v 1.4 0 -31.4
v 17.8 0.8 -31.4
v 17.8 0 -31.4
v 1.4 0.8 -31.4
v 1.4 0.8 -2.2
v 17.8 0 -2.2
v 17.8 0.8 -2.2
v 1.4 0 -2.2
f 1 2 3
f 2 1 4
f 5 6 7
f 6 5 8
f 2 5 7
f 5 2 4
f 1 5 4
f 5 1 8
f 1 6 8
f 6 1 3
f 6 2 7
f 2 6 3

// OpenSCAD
// file: ../p/4-4edge.scad
use <../lib.scad>
$fa=1; $fs=0.2;
function ldraw_lib__4_4edge(realsolid=false) = [
// 0 Circle 1.0
// 0 Name: 4-4edge.dat
// 0 Author: James Jessiman
// 0 !LDRAW_ORG Primitive UPDATE 2017-01
// 0 !LICENSE Licensed under CC BY 2.0 and CC BY 4.0 : see CAreadme.txt
// 
// 0 BFC CERTIFY CCW
  [0,"BFC","CERTIFY"],
  [0,"BFC","CCW"],
// 
// 0 !HISTORY 1998-12-15 [PTadmin] Official Update 1998-10
// 0 !HISTORY 2005-12-28 [PTadmin] Official Update 2005-01
// 0 !HISTORY 2007-06-24 [PTadmin] Header formatted for Contributor Agreement
// 0 !HISTORY 2008-07-01 [PTadmin] Official Update 2008-01
// 0 !HISTORY 2017-01-15 [Steffen] BFCed
// 0 !HISTORY 2017-12-30 [PTadmin] Official Update 2017-01
// 
// 
// 2 24 1 0 0 0.9239 0 0.3827
  [2,24,1,0,0,0.9239,0,0.3827],
// 2 24 0.9239 0 0.3827 0.7071 0 0.7071
  [2,24,0.9239,0,0.3827,0.7071,0,0.7071],
// 2 24 0.7071 0 0.7071 0.3827 0 0.9239
  [2,24,0.7071,0,0.7071,0.3827,0,0.9239],
// 2 24 0.3827 0 0.9239 0 0 1
  [2,24,0.3827,0,0.9239,0,0,1],
// 2 24 0 0 1 -0.3827 0 0.9239
  [2,24,0,0,1,-0.3827,0,0.9239],
// 2 24 -0.3827 0 0.9239 -0.7071 0 0.7071
  [2,24,-0.3827,0,0.9239,-0.7071,0,0.7071],
// 2 24 -0.7071 0 0.7071 -0.9239 0 0.3827
  [2,24,-0.7071,0,0.7071,-0.9239,0,0.3827],
// 2 24 -0.9239 0 0.3827 -1 0 -0
  [2,24,-0.9239,0,0.3827,-1,0,-0],
// 2 24 -1 0 -0 -0.9239 0 -0.3827
  [2,24,-1,0,-0,-0.9239,0,-0.3827],
// 2 24 -0.9239 0 -0.3827 -0.7071 0 -0.7071
  [2,24,-0.9239,0,-0.3827,-0.7071,0,-0.7071],
// 2 24 -0.7071 0 -0.7071 -0.3827 0 -0.9239
  [2,24,-0.7071,0,-0.7071,-0.3827,0,-0.9239],
// 2 24 -0.3827 0 -0.9239 0 0 -1
  [2,24,-0.3827,0,-0.9239,0,0,-1],
// 2 24 0 0 -1 0.3827 0 -0.9239
  [2,24,0,0,-1,0.3827,0,-0.9239],
// 2 24 0.3827 0 -0.9239 0.7071 0 -0.7071
  [2,24,0.3827,0,-0.9239,0.7071,0,-0.7071],
// 2 24 0.7071 0 -0.7071 0.9239 0 -0.3827
  [2,24,0.7071,0,-0.7071,0.9239,0,-0.3827],
// 2 24 0.9239 0 -0.3827 1 0 0
  [2,24,0.9239,0,-0.3827,1,0,0],
];
module ldraw_lib__4_4edge(step=0, col=false, unit=2/5, alt=false, line=0.2, solid=!$preview)
    makepoly(ldraw_lib__4_4edge(solid), step=step, col=col, unit=unit, alt=alt, line=line, solid=solid);
ldraw_lib__4_4edge(line=0.2);
// file: ../p/4-4disc.scad
use <../lib.scad>
$fa=1; $fs=0.2;
function ldraw_lib__4_4disc(realsolid=false) = [
// 0 Disc 1.0
// 0 Name: 4-4disc.dat
// 0 Author: James Jessiman
// 0 !LDRAW_ORG Primitive UPDATE 2002-02
// 0 !LICENSE Licensed under CC BY 2.0 and CC BY 4.0 : see CAreadme.txt
// 
// 0 BFC CERTIFY CCW
  [0,"BFC","CERTIFY"],
  [0,"BFC","CCW"],
// 
// 0 !HISTORY 1998-12-15 [PTadmin] Official Update 1998-10
// 0 !HISTORY 2002-03-23 [sbliss] Added BFC statement
// 0 !HISTORY 2002-04-25 [PTadmin] Official Update 2002-02
// 0 !HISTORY 2007-06-24 [PTadmin] Header formatted for Contributor Agreement
// 0 !HISTORY 2008-07-01 [PTadmin] Official Update 2008-01
// 
// 
// 3 16 0 0 0 1 0 0 0.9239 0 0.3827
  [3,16,0,0,0,1,0,0,0.9239,0,0.3827],
// 3 16 0 0 0 0.9239 0 0.3827 0.7071 0 0.7071
  [3,16,0,0,0,0.9239,0,0.3827,0.7071,0,0.7071],
// 3 16 0 0 0 0.7071 0 0.7071 0.3827 0 0.9239
  [3,16,0,0,0,0.7071,0,0.7071,0.3827,0,0.9239],
// 3 16 0 0 0 0.3827 0 0.9239 0 0 1
  [3,16,0,0,0,0.3827,0,0.9239,0,0,1],
// 3 16 0 0 0 0 0 1 -0.3827 0 0.9239
  [3,16,0,0,0,0,0,1,-0.3827,0,0.9239],
// 3 16 0 0 0 -0.3827 0 0.9239 -0.7071 0 0.7071
  [3,16,0,0,0,-0.3827,0,0.9239,-0.7071,0,0.7071],
// 3 16 0 0 0 -0.7071 0 0.7071 -0.9239 0 0.3827
  [3,16,0,0,0,-0.7071,0,0.7071,-0.9239,0,0.3827],
// 3 16 0 0 0 -0.9239 0 0.3827 -1 0 -0
  [3,16,0,0,0,-0.9239,0,0.3827,-1,0,-0],
// 3 16 0 0 0 -1 0 -0 -0.9239 0 -0.3827
  [3,16,0,0,0,-1,0,-0,-0.9239,0,-0.3827],
// 3 16 0 0 0 -0.9239 0 -0.3827 -0.7071 0 -0.7071
  [3,16,0,0,0,-0.9239,0,-0.3827,-0.7071,0,-0.7071],
// 3 16 0 0 0 -0.7071 0 -0.7071 -0.3827 0 -0.9239
  [3,16,0,0,0,-0.7071,0,-0.7071,-0.3827,0,-0.9239],
// 3 16 0 0 0 -0.3827 0 -0.9239 0 0 -1
  [3,16,0,0,0,-0.3827,0,-0.9239,0,0,-1],
// 3 16 0 0 0 0 0 -1 0.3827 0 -0.9239
  [3,16,0,0,0,0,0,-1,0.3827,0,-0.9239],
// 3 16 0 0 0 0.3827 0 -0.9239 0.7071 0 -0.7071
  [3,16,0,0,0,0.3827,0,-0.9239,0.7071,0,-0.7071],
// 3 16 0 0 0 0.7071 0 -0.7071 0.9239 0 -0.3827
  [3,16,0,0,0,0.7071,0,-0.7071,0.9239,0,-0.3827],
// 3 16 0 0 0 0.9239 0 -0.3827 1 0 0
  [3,16,0,0,0,0.9239,0,-0.3827,1,0,0],
// 0
];
module ldraw_lib__4_4disc(step=0, col=false, unit=2/5, alt=false, line=0.2, solid=!$preview)
    makepoly(ldraw_lib__4_4disc(solid), step=step, col=col, unit=unit, alt=alt, line=line, solid=solid);
ldraw_lib__4_4disc(line=0.2);
// file: ../p/4-4cyli.scad
use <../lib.scad>
$fa=1; $fs=0.2;
function ldraw_lib__4_4cyli(realsolid=false) = [
// 0 Cylinder 1.0
// 0 Name: 4-4cyli.dat
// 0 Author: James Jessiman
// 0 !LDRAW_ORG Primitive UPDATE 2005-01
// 0 !LICENSE Licensed under CC BY 2.0 and CC BY 4.0 : see CAreadme.txt
// 
// 0 BFC CERTIFY CCW
  [0,"BFC","CERTIFY"],
  [0,"BFC","CCW"],
// 
// 0 !HISTORY 1998-12-15 [PTadmin] Official Update 1998-10
// 0 !HISTORY 2002-03-23 [sbliss] Added BFC statement; merged headers from files in distributions LDraw 0.27 and Complete.
// 0 !HISTORY 2002-04-25 [PTadmin] Official Update 2002-02
// 0 !HISTORY 2004-12-14 [guyvivan] BFC CCW
// 0 !HISTORY 2005-12-28 [PTadmin] Official Update 2005-01
// 0 !HISTORY 2007-06-24 [PTadmin] Header formatted for Contributor Agreement
// 0 !HISTORY 2008-07-01 [PTadmin] Official Update 2008-01
// 
// 
// 4 16 1 1 0 0.9239 1 0.3827 0.9239 0 0.3827 1 0 0
  [4,16,1,1,0,0.9239,1,0.3827,0.9239,0,0.3827,1,0,0],
// 5 24 1 0 0 1 1 0 0.9239 0 0.3827 0.9239 0 -0.3827
  [5,24,1,0,0,1,1,0,0.9239,0,0.3827,0.9239,0,-0.3827],
// 4 16 0.9239 1 0.3827 0.7071 1 0.7071 0.7071 0 0.7071 0.9239 0 0.3827
  [4,16,0.9239,1,0.3827,0.7071,1,0.7071,0.7071,0,0.7071,0.9239,0,0.3827],
// 5 24 0.9239 0 0.3827 0.9239 1 0.3827 0.7071 0 0.7071 1 0 0
  [5,24,0.9239,0,0.3827,0.9239,1,0.3827,0.7071,0,0.7071,1,0,0],
// 4 16 0.7071 1 0.7071 0.3827 1 0.9239 0.3827 0 0.9239 0.7071 0 0.7071
  [4,16,0.7071,1,0.7071,0.3827,1,0.9239,0.3827,0,0.9239,0.7071,0,0.7071],
// 5 24 0.7071 0 0.7071 0.7071 1 0.7071 0.3827 0 0.9239 0.9239 0 0.3827
  [5,24,0.7071,0,0.7071,0.7071,1,0.7071,0.3827,0,0.9239,0.9239,0,0.3827],
// 4 16 0.3827 1 0.9239 0 1 1 0 0 1 0.3827 0 0.9239
  [4,16,0.3827,1,0.9239,0,1,1,0,0,1,0.3827,0,0.9239],
// 5 24 0.3827 0 0.9239 0.3827 1 0.9239 0 0 1 0.7071 0 0.7071
  [5,24,0.3827,0,0.9239,0.3827,1,0.9239,0,0,1,0.7071,0,0.7071],
// 4 16 0 1 1 -0.3827 1 0.9239 -0.3827 0 0.9239 0 0 1
  [4,16,0,1,1,-0.3827,1,0.9239,-0.3827,0,0.9239,0,0,1],
// 5 24 0 0 1 0 1 1 -0.3827 0 0.9239 0.3827 0 0.9239
  [5,24,0,0,1,0,1,1,-0.3827,0,0.9239,0.3827,0,0.9239],
// 4 16 -0.3827 1 0.9239 -0.7071 1 0.7071 -0.7071 0 0.7071 -0.3827 0 0.9239
  [4,16,-0.3827,1,0.9239,-0.7071,1,0.7071,-0.7071,0,0.7071,-0.3827,0,0.9239],
// 5 24 -0.3827 0 0.9239 -0.3827 1 0.9239 -0.7071 0 0.7071 0 0 1
  [5,24,-0.3827,0,0.9239,-0.3827,1,0.9239,-0.7071,0,0.7071,0,0,1],
// 4 16 -0.7071 1 0.7071 -0.9239 1 0.3827 -0.9239 0 0.3827 -0.7071 0 0.7071
  [4,16,-0.7071,1,0.7071,-0.9239,1,0.3827,-0.9239,0,0.3827,-0.7071,0,0.7071],
// 5 24 -0.7071 0 0.7071 -0.7071 1 0.7071 -0.9239 0 0.3827 -0.3827 0 0.9239
  [5,24,-0.7071,0,0.7071,-0.7071,1,0.7071,-0.9239,0,0.3827,-0.3827,0,0.9239],
// 4 16 -0.9239 1 0.3827 -1 1 0 -1 0 0 -0.9239 0 0.3827
  [4,16,-0.9239,1,0.3827,-1,1,0,-1,0,0,-0.9239,0,0.3827],
// 5 24 -0.9239 0 0.3827 -0.9239 1 0.3827 -1 0 0 -0.7071 0 0.7071
  [5,24,-0.9239,0,0.3827,-0.9239,1,0.3827,-1,0,0,-0.7071,0,0.7071],
// 4 16 -1 1 0 -0.9239 1 -0.3827 -0.9239 0 -0.3827 -1 0 0
  [4,16,-1,1,0,-0.9239,1,-0.3827,-0.9239,0,-0.3827,-1,0,0],
// 5 24 -1 0 0 -1 1 0 -0.9239 0 -0.3827 -0.9239 0 0.3827
  [5,24,-1,0,0,-1,1,0,-0.9239,0,-0.3827,-0.9239,0,0.3827],
// 4 16 -0.9239 1 -0.3827 -0.7071 1 -0.7071 -0.7071 0 -0.7071 -0.9239 0 -0.3827
  [4,16,-0.9239,1,-0.3827,-0.7071,1,-0.7071,-0.7071,0,-0.7071,-0.9239,0,-0.3827],
// 5 24 -0.9239 0 -0.3827 -0.9239 1 -0.3827 -0.7071 0 -0.7071 -1 0 0
  [5,24,-0.9239,0,-0.3827,-0.9239,1,-0.3827,-0.7071,0,-0.7071,-1,0,0],
// 4 16 -0.7071 1 -0.7071 -0.3827 1 -0.9239 -0.3827 0 -0.9239 -0.7071 0 -0.7071
  [4,16,-0.7071,1,-0.7071,-0.3827,1,-0.9239,-0.3827,0,-0.9239,-0.7071,0,-0.7071],
// 5 24 -0.7071 0 -0.7071 -0.7071 1 -0.7071 -0.3827 0 -0.9239 -0.9239 0 -0.3827
  [5,24,-0.7071,0,-0.7071,-0.7071,1,-0.7071,-0.3827,0,-0.9239,-0.9239,0,-0.3827],
// 4 16 -0.3827 1 -0.9239 0 1 -1 0 0 -1 -0.3827 0 -0.9239
  [4,16,-0.3827,1,-0.9239,0,1,-1,0,0,-1,-0.3827,0,-0.9239],
// 5 24 -0.3827 0 -0.9239 -0.3827 1 -0.9239 0 0 -1 -0.7071 0 -0.7071
  [5,24,-0.3827,0,-0.9239,-0.3827,1,-0.9239,0,0,-1,-0.7071,0,-0.7071],
// 4 16 0 1 -1 0.3827 1 -0.9239 0.3827 0 -0.9239 0 0 -1
  [4,16,0,1,-1,0.3827,1,-0.9239,0.3827,0,-0.9239,0,0,-1],
// 5 24 0 0 -1 0 1 -1 0.3827 0 -0.9239 -0.3827 0 -0.9239
  [5,24,0,0,-1,0,1,-1,0.3827,0,-0.9239,-0.3827,0,-0.9239],
// 4 16 0.3827 1 -0.9239 0.7071 1 -0.7071 0.7071 0 -0.7071 0.3827 0 -0.9239
  [4,16,0.3827,1,-0.9239,0.7071,1,-0.7071,0.7071,0,-0.7071,0.3827,0,-0.9239],
// 5 24 0.3827 0 -0.9239 0.3827 1 -0.9239 0.7071 0 -0.7071 0 0 -1
  [5,24,0.3827,0,-0.9239,0.3827,1,-0.9239,0.7071,0,-0.7071,0,0,-1],
// 4 16 0.7071 1 -0.7071 0.9239 1 -0.3827 0.9239 0 -0.3827 0.7071 0 -0.7071
  [4,16,0.7071,1,-0.7071,0.9239,1,-0.3827,0.9239,0,-0.3827,0.7071,0,-0.7071],
// 5 24 0.7071 0 -0.7071 0.7071 1 -0.7071 0.9239 0 -0.3827 0.3827 0 -0.9239
  [5,24,0.7071,0,-0.7071,0.7071,1,-0.7071,0.9239,0,-0.3827,0.3827,0,-0.9239],
// 4 16 0.9239 1 -0.3827 1 1 0 1 0 0 0.9239 0 -0.3827
  [4,16,0.9239,1,-0.3827,1,1,0,1,0,0,0.9239,0,-0.3827],
// 5 24 0.9239 0 -0.3827 0.9239 1 -0.3827 1 0 0 0.7071 0 -0.7071
  [5,24,0.9239,0,-0.3827,0.9239,1,-0.3827,1,0,0,0.7071,0,-0.7071],
// 0
];
module ldraw_lib__4_4cyli(step=0, col=false, unit=2/5, alt=false, line=0.2, solid=!$preview)
    makepoly(ldraw_lib__4_4cyli(solid), step=step, col=col, unit=unit, alt=alt, line=line, solid=solid);
ldraw_lib__4_4cyli(line=0.2);
// file: ../p/stud3.scad
use <../lib.scad>
use <4-4cyli.scad>
use <4-4disc.scad>
use <4-4edge.scad>
$fa=1; $fs=0.2;
function ldraw_lib__stud3(realsolid=false) = realsolid ? 
    [openscad(translate([0,0,-eps()], o=cylinder(4+eps(), r=4)),2)] : [
// 0 Stud Tube Solid
// 0 Name: stud3.dat
// 0 Author: James Jessiman
// 0 !LDRAW_ORG Primitive UPDATE 2012-01
// 0 !LICENSE Licensed under CC BY 2.0 and CC BY 4.0 : see CAreadme.txt
// 
// 0 BFC CERTIFY CCW
  [0,"BFC","CERTIFY"],
  [0,"BFC","CCW"],
// 
// 0 !HISTORY 2002-04-04 [sbliss] Modified for BFC compliance
// 0 !HISTORY 2002-04-25 [PTadmin] Official Update 2002-02
// 0 !HISTORY 2007-06-24 [PTadmin] Header formatted for Contributor Agreement
// 0 !HISTORY 2008-07-01 [PTadmin] Official Update 2008-01
// 0 !HISTORY 2012-02-16 [Philo] Changed to CCW
// 0 !HISTORY 2012-03-30 [PTadmin] Official Update 2012-01
// 
// 
// 1 16 0 -4 0 4 0 0 0 1 0 0 0 4 4-4edge.dat
  [1,16,0,-4,0,4,0,0,0,1,0,0,0,4, ldraw_lib__4_4edge(realsolid)],
// 1 16 0 0 0 4 0 0 0 1 0 0 0 4 4-4edge.dat
  [1,16,0,0,0,4,0,0,0,1,0,0,0,4, ldraw_lib__4_4edge(realsolid)],
// 1 16 0 -4 0 4 0 0 0 1 0 0 0 4 4-4disc.dat
  [1,16,0,-4,0,4,0,0,0,1,0,0,0,4, ldraw_lib__4_4disc(realsolid)],
// 1 16 0 -4 0 4 0 0 0 4 0 0 0 4 4-4cyli.dat
  [1,16,0,-4,0,4,0,0,0,4,0,0,0,4, ldraw_lib__4_4cyli(realsolid)],
];
module ldraw_lib__stud3(step=0, col=false, unit=2/5, alt=false, line=0.2, solid=!$preview)
    makepoly(ldraw_lib__stud3(solid), step=step, col=col, unit=unit, alt=alt, line=line, solid=solid);
ldraw_lib__stud3(line=0.2);
// file: ../p/stud.scad
use <../lib.scad>
use <4-4cyli.scad>
use <4-4disc.scad>
use <4-4edge.scad>
$fa=1; $fs=0.2;
function ldraw_lib__stud(realsolid=false) = realsolid ? 
    [openscad(translate([0,0,-eps()], o=cylinder(4+eps(), r=6)),2)] : [
// 0 Stud
// 0 Name: stud.dat
// 0 Author: James Jessiman
// 0 !LDRAW_ORG Primitive UPDATE 2012-01
// 0 !LICENSE Licensed under CC BY 2.0 and CC BY 4.0 : see CAreadme.txt
// 
// 0 BFC CERTIFY CCW
  [0,"BFC","CERTIFY"],
  [0,"BFC","CCW"],
// 
// 0 !HISTORY 2002-04-04 [sbliss] Modified for BFC compliance
// 0 !HISTORY 2002-04-25 [PTadmin] Official Update 2002-02
// 0 !HISTORY 2007-06-24 [PTadmin] Header formatted for Contributor Agreement
// 0 !HISTORY 2008-07-01 [PTadmin] Official Update 2008-01
// 0 !HISTORY 2012-02-16 [Philo] Changed to CCW
// 0 !HISTORY 2012-03-30 [PTadmin] Official Update 2012-01
// 
// 
// 1 16 0 0 0 6 0 0 0 1 0 0 0 6 4-4edge.dat
  [1,16,0,0,0,6,0,0,0,1,0,0,0,6, ldraw_lib__4_4edge(realsolid)],
// 1 16 0 -4 0 6 0 0 0 1 0 0 0 6 4-4edge.dat
  [1,16,0,-4,0,6,0,0,0,1,0,0,0,6, ldraw_lib__4_4edge(realsolid)],
// 1 16 0 0 0 6 0 0 0 -4 0 0 0 6 4-4cyli.dat
  [1,16,0,0,0,6,0,0,0,-4,0,0,0,6, ldraw_lib__4_4cyli(realsolid)],
// 1 16 0 -4 0 6 0 0 0 1 0 0 0 6 4-4disc.dat
  [1,16,0,-4,0,6,0,0,0,1,0,0,0,6, ldraw_lib__4_4disc(realsolid)],
];
module ldraw_lib__stud(step=0, col=false, unit=2/5, alt=false, line=0.2, solid=!$preview)
    makepoly(ldraw_lib__stud(solid), step=step, col=col, unit=unit, alt=alt, line=line, solid=solid);
ldraw_lib__stud(line=0.2);
// file: ../p/box5.scad
use <../lib.scad>
$fa=1; $fs=0.2;
function ldraw_lib__box5(realsolid=false) = [
// 0 Box with 5 Faces and All Edges
// 0 Name: box5.dat
// 0 Author: James Jessiman
// 0 !LDRAW_ORG Primitive UPDATE 2012-01
// 0 !LICENSE Licensed under CC BY 2.0 and CC BY 4.0 : see CAreadme.txt
// 
// 0 BFC CERTIFY CCW
  [0,"BFC","CERTIFY"],
  [0,"BFC","CCW"],
// 
// 0 !HISTORY 2002-04-03 [sbliss] Modified for BFC compliance
// 0 !HISTORY 2002-04-25 [PTadmin] Official Update 2002-02
// 0 !HISTORY 2007-06-24 [PTadmin] Header formatted for Contributor Agreement
// 0 !HISTORY 2008-07-01 [PTadmin] Official Update 2008-01
// 0 !HISTORY 2012-02-16 [Philo] Changed to CCW
// 0 !HISTORY 2012-03-30 [PTadmin] Official Update 2012-01
// 
// 
// 2 24 1 1 1 -1 1 1
  [2,24,1,1,1,-1,1,1],
// 2 24 -1 1 1 -1 1 -1
  [2,24,-1,1,1,-1,1,-1],
// 2 24 -1 1 -1 1 1 -1
  [2,24,-1,1,-1,1,1,-1],
// 2 24 1 1 -1 1 1 1
  [2,24,1,1,-1,1,1,1],
// 2 24 1 0 1 -1 0 1
  [2,24,1,0,1,-1,0,1],
// 2 24 -1 0 1 -1 0 -1
  [2,24,-1,0,1,-1,0,-1],
// 2 24 -1 0 -1 1 0 -1
  [2,24,-1,0,-1,1,0,-1],
// 2 24 1 0 -1 1 0 1
  [2,24,1,0,-1,1,0,1],
// 2 24 1 0 1 1 1 1
  [2,24,1,0,1,1,1,1],
// 2 24 -1 0 1 -1 1 1
  [2,24,-1,0,1,-1,1,1],
// 2 24 1 0 -1 1 1 -1
  [2,24,1,0,-1,1,1,-1],
// 2 24 -1 0 -1 -1 1 -1
  [2,24,-1,0,-1,-1,1,-1],
// 4 16 -1 1 1 1 1 1 1 1 -1 -1 1 -1
  [4,16,-1,1,1,1,1,1,1,1,-1,-1,1,-1],
// 4 16 -1 1 1 -1 0 1 1 0 1 1 1 1
  [4,16,-1,1,1,-1,0,1,1,0,1,1,1,1],
// 4 16 -1 1 -1 -1 0 -1 -1 0 1 -1 1 1
  [4,16,-1,1,-1,-1,0,-1,-1,0,1,-1,1,1],
// 4 16 1 1 -1 1 0 -1 -1 0 -1 -1 1 -1
  [4,16,1,1,-1,1,0,-1,-1,0,-1,-1,1,-1],
// 4 16 1 1 1 1 0 1 1 0 -1 1 1 -1
  [4,16,1,1,1,1,0,1,1,0,-1,1,1,-1],
];
module ldraw_lib__box5(step=0, col=false, unit=2/5, alt=false, line=0.2, solid=!$preview)
    makepoly(ldraw_lib__box5(solid), step=step, col=col, unit=unit, alt=alt, line=line, solid=solid);
ldraw_lib__box5(line=0.2);
// file: ../p/box4t.scad
use <../lib.scad>
$fa=1; $fs=0.2;
function ldraw_lib__box4t(realsolid=false) = [
// 0 Box with 4 Adjacent Faces and All Edges
// 0 Name: box4t.dat
// 0 Author: Tore Eriksson [Tore_Eriksson]
// 0 !LDRAW_ORG Primitive UPDATE 2003-02
// 0 !LICENSE Licensed under CC BY 2.0 and CC BY 4.0 : see CAreadme.txt
// 
// 0 BFC CERTIFY CCW
  [0,"BFC","CERTIFY"],
  [0,"BFC","CCW"],
// 
// 0 !HISTORY 1997-09-29 [PTadmin] Official Update 1997-15
// 0 !HISTORY 2002-08-31 [izanette] Modified with WINDZ for BFC compliance
// 0 !HISTORY 2003-08-01 [PTadmin] Official Update 2003-02
// 0 !HISTORY 2007-06-24 [PTadmin] Header formatted for Contributor Agreement
// 0 !HISTORY 2008-07-01 [PTadmin] Official Update 2008-01
// 
// 
// 2 24 1 1 1 -1 1 1
  [2,24,1,1,1,-1,1,1],
// 2 24 -1 1 1 -1 1 -1
  [2,24,-1,1,1,-1,1,-1],
// 2 24 -1 1 -1 1 1 -1
  [2,24,-1,1,-1,1,1,-1],
// 2 24 1 1 -1 1 1 1
  [2,24,1,1,-1,1,1,1],
// 2 24 1 0 1 -1 0 1
  [2,24,1,0,1,-1,0,1],
// 2 24 -1 0 1 -1 0 -1
  [2,24,-1,0,1,-1,0,-1],
// 2 24 -1 0 -1 1 0 -1
  [2,24,-1,0,-1,1,0,-1],
// 2 24 1 0 -1 1 0 1
  [2,24,1,0,-1,1,0,1],
// 2 24 1 0 1 1 1 1
  [2,24,1,0,1,1,1,1],
// 2 24 -1 0 1 -1 1 1
  [2,24,-1,0,1,-1,1,1],
// 2 24 1 0 -1 1 1 -1
  [2,24,1,0,-1,1,1,-1],
// 2 24 -1 0 -1 -1 1 -1
  [2,24,-1,0,-1,-1,1,-1],
// 4 16 1 1 1 1 1 -1 -1 1 -1 -1 1 1
  [4,16,1,1,1,1,1,-1,-1,1,-1,-1,1,1],
// 4 16 1 1 1 -1 1 1 -1 0 1 1 0 1
  [4,16,1,1,1,-1,1,1,-1,0,1,1,0,1],
// 4 16 -1 1 1 -1 1 -1 -1 0 -1 -1 0 1
  [4,16,-1,1,1,-1,1,-1,-1,0,-1,-1,0,1],
// 0 4 16 -1 1 -1 -1 0 -1 1 0 -1 1 1 -1
// 4 16 1 1 -1 1 1 1 1 0 1 1 0 -1
  [4,16,1,1,-1,1,1,1,1,0,1,1,0,-1],
// 0
];
module ldraw_lib__box4t(step=0, col=false, unit=2/5, alt=false, line=0.2, solid=!$preview)
    makepoly(ldraw_lib__box4t(solid), step=step, col=col, unit=unit, alt=alt, line=line, solid=solid);
ldraw_lib__box4t(line=0.2);
// file: s/3004s01.scad
use <../../lib.scad>
use <../../p/box4t.scad>
use <../../p/box5.scad>
use <../../p/stud.scad>
use <../../p/stud3.scad>
$fa=1; $fs=0.2;
function ldraw_lib__s__3004s01(realsolid=false) = [
// 0 ~Brick  1 x  2 without Front Face
// 0 Name: s\3004s01.dat
// 0 Author: James Jessiman
// 0 !LDRAW_ORG Subpart UPDATE 2003-03
// 0 !LICENSE Licensed under CC BY 2.0 and CC BY 4.0 : see CAreadme.txt
// 
// 0 BFC CERTIFY CCW
  [0,"BFC","CERTIFY"],
  [0,"BFC","CCW"],
// 
// 0 !HISTORY 2003-09-07 [jriley] Subfiling, BFC
// 0 !HISTORY 2003-12-19 [PTadmin] Official Update 2003-03
// 0 !HISTORY 2007-08-29 [PTadmin] Header formatted for Contributor Agreement
// 0 !HISTORY 2008-07-01 [PTadmin] Official Update 2008-01
// 
// 
// 1 16 0 4 0 1 0 0 0 -5 0 0 0 1 stud3.dat
  [1,16,0,4,0,1,0,0,0,-5,0,0,0,1, ldraw_lib__stud3(realsolid)],
// 0 BFC INVERTNEXT
  [0,"BFC","INVERTNEXT"],
// 1 16 0 24 0 16 0 0 0 -20 0 0 0 6 box5.dat
  [1,16,0,24,0,16,0,0,0,-20,0,0,0,6, ldraw_lib__box5(realsolid)],
// 4 16 20 24 10 16 24 6 -16 24 6 -20 24 10
  [4,16,20,24,10,16,24,6,-16,24,6,-20,24,10],
// 4 16 -20 24 10 -16 24 6 -16 24 -6 -20 24 -10
  [4,16,-20,24,10,-16,24,6,-16,24,-6,-20,24,-10],
// 4 16 -20 24 -10 -16 24 -6 16 24 -6 20 24 -10
  [4,16,-20,24,-10,-16,24,-6,16,24,-6,20,24,-10],
// 4 16 20 24 -10 16 24 -6 16 24 6 20 24 10
  [4,16,20,24,-10,16,24,-6,16,24,6,20,24,10],
// 1 16 0 24 0 20 0 0 0 -24 0 0 0 10 box4t.dat
  [1,16,0,24,0,20,0,0,0,-24,0,0,0,10, ldraw_lib__box4t(realsolid)],
// 1 16 10 0 0 1 0 0 0 1 0 0 0 1 stud.dat
  [1,16,10,0,0,1,0,0,0,1,0,0,0,1, ldraw_lib__stud(realsolid)],
// 1 16 -10 0 0 1 0 0 0 1 0 0 0 1 stud.dat
  [1,16,-10,0,0,1,0,0,0,1,0,0,0,1, ldraw_lib__stud(realsolid)],
// 0
];
module ldraw_lib__s__3004s01(step=0, col=false, unit=2/5, alt=false, line=0.2, solid=!$preview)
    makepoly(ldraw_lib__s__3004s01(solid), step=step, col=col, unit=unit, alt=alt, line=line, solid=solid);
ldraw_lib__s__3004s01(line=0.2);
// file: 3004.scad
use <../lib.scad>
use <s/3004s01.scad>
$fa=1; $fs=0.2;
function ldraw_lib__3004(realsolid=false) = [
// 0 Brick  1 x  2
// 0 Name: 3004.dat
// 0 Author: James Jessiman
// 0 !LDRAW_ORG Part UPDATE 2022-05
// 0 !LICENSE Licensed under CC BY 2.0 and CC BY 4.0 : see CAreadme.txt
// 
// 0 BFC CERTIFY CCW
  [0,"BFC","CERTIFY"],
  [0,"BFC","CCW"],
// 
// 0 !HISTORY 2001-10-26 [PTadmin] Official Update 2001-01
// 0 !HISTORY 2002-05-07 {unknown} BFC Certification
// 0 !HISTORY 2002-06-11 [PTadmin] Official Update 2002-03
// 0 !HISTORY 2007-05-07 [PTadmin] Header formatted for Contributor Agreement
// 0 !HISTORY 2008-07-01 [PTadmin] Official Update 2008-01
// 0 !HISTORY 2022-08-04 [MagFors] Using subfile
// 0 !HISTORY 2022-09-15 [PTadmin] Official Update 2022-05
// 
// 
// 1 16 0 0 0 1 0 0 0 1 0 0 0 1 s\3004s01.dat
  [1,16,0,0,0,1,0,0,0,1,0,0,0,1, ldraw_lib__s__3004s01(realsolid)],
// 4 16 -20 24 -10 20 24 -10 20 0 -10 -20 0 -10
  [4,16,-20,24,-10,20,24,-10,20,0,-10,-20,0,-10],
];
module ldraw_lib__3004(step=0, col=false, unit=2/5, alt=false, line=0.2, solid=!$preview)
    makepoly(ldraw_lib__3004(solid), step=step, col=col, unit=unit, alt=alt, line=line, solid=solid);
ldraw_lib__3004(line=0.2);
// file: ../p/box.scad
use <../lib.scad>
$fa=1; $fs=0.2;
function ldraw_lib__box(realsolid=false) = [
// 0 Box 6 (six faces)
// 0 Name: box.dat
// 0 Author: James Jessiman
// 0 !LDRAW_ORG Primitive UPDATE 2002-05
// 0 !LICENSE Licensed under CC BY 2.0 and CC BY 4.0 : see CAreadme.txt
// 
// 0 BFC CERTIFY CCW
  [0,"BFC","CERTIFY"],
  [0,"BFC","CCW"],
// 
// 0 !HISTORY 2002-08-22 [sbliss] Applied BFC
// 0 !HISTORY 2002-11-30 [PTadmin] Official Update 2002-05
// 0 !HISTORY 2007-06-24 [PTadmin] Header formatted for Contributor Agreement
// 0 !HISTORY 2008-07-01 [PTadmin] Official Update 2008-01
// 
// 
// 2 24 1 1 1 -1 1 1
  [2,24,1,1,1,-1,1,1],
// 2 24 -1 1 1 -1 1 -1
  [2,24,-1,1,1,-1,1,-1],
// 2 24 -1 1 -1 1 1 -1
  [2,24,-1,1,-1,1,1,-1],
// 2 24 1 1 -1 1 1 1
  [2,24,1,1,-1,1,1,1],
// 2 24 1 -1 1 -1 -1 1
  [2,24,1,-1,1,-1,-1,1],
// 2 24 -1 -1 1 -1 -1 -1
  [2,24,-1,-1,1,-1,-1,-1],
// 2 24 -1 -1 -1 1 -1 -1
  [2,24,-1,-1,-1,1,-1,-1],
// 2 24 1 -1 -1 1 -1 1
  [2,24,1,-1,-1,1,-1,1],
// 2 24 1 -1 1 1 1 1
  [2,24,1,-1,1,1,1,1],
// 2 24 -1 -1 1 -1 1 1
  [2,24,-1,-1,1,-1,1,1],
// 2 24 1 -1 -1 1 1 -1
  [2,24,1,-1,-1,1,1,-1],
// 2 24 -1 -1 -1 -1 1 -1
  [2,24,-1,-1,-1,-1,1,-1],
// 4 16 1 1 1 1 1 -1 -1 1 -1 -1 1 1
  [4,16,1,1,1,1,1,-1,-1,1,-1,-1,1,1],
// 4 16 -1 -1 -1 1 -1 -1 1 -1 1 -1 -1 1
  [4,16,-1,-1,-1,1,-1,-1,1,-1,1,-1,-1,1],
// 4 16 -1 -1 1 1 -1 1 1 1 1 -1 1 1
  [4,16,-1,-1,1,1,-1,1,1,1,1,-1,1,1],
// 4 16 -1 -1 -1 -1 -1 1 -1 1 1 -1 1 -1
  [4,16,-1,-1,-1,-1,-1,1,-1,1,1,-1,1,-1],
// 4 16 1 -1 -1 -1 -1 -1 -1 1 -1 1 1 -1
  [4,16,1,-1,-1,-1,-1,-1,-1,1,-1,1,1,-1],
// 4 16 1 -1 1 1 -1 -1 1 1 -1 1 1 1
  [4,16,1,-1,1,1,-1,-1,1,1,-1,1,1,1],
// 0
];
module ldraw_lib__box(step=0, col=false, unit=2/5, alt=false, line=0.2, solid=!$preview)
    makepoly(ldraw_lib__box(solid), step=step, col=col, unit=unit, alt=alt, line=line, solid=solid);
ldraw_lib__box(line=0.2);
// main file
use <../lib.scad>
use <../p/box.scad>
$fa=1; $fs=0.2;
function ldraw_lib__268(realsolid=false) = [
// 0 ~Glass for Door  1 x  3 x  4
// 0 Name: 268.dat
// 0 Author: Niels Karsdorp [nielsk]
// 0 !LDRAW_ORG Part UPDATE 2004-02
// 0 !LICENSE Licensed under CC BY 2.0 and CC BY 4.0 : see CAreadme.txt
// 
// 0 BFC CERTIFY CW
  [0,"BFC","CERTIFY"],
  [0,"BFC","CW"],
// 
// 0 !HISTORY 2004-04-22 [PTadmin] Official Update 2004-02
// 0 !HISTORY 2007-05-17 [PTadmin] Header formatted for Contributor Agreement
// 0 !HISTORY 2008-07-01 [PTadmin] Official Update 2008-01
// 
// 
// 1 16 24 42 1 20.5 0 0 0 36.5 0 0 0 1 box.dat
  [1,16,24,42,1,20.5,0,0,0,36.5,0,0,0,1, ldraw_lib__box(realsolid)],
// 0
];
module ldraw_lib__268(step=0, col=false, unit=2/5, alt=false, line=0.2, solid=!$preview)
    makepoly(ldraw_lib__268(solid), step=step, col=col, unit=unit, alt=alt, line=line, solid=solid);
ldraw_lib__268(line=0.2);
